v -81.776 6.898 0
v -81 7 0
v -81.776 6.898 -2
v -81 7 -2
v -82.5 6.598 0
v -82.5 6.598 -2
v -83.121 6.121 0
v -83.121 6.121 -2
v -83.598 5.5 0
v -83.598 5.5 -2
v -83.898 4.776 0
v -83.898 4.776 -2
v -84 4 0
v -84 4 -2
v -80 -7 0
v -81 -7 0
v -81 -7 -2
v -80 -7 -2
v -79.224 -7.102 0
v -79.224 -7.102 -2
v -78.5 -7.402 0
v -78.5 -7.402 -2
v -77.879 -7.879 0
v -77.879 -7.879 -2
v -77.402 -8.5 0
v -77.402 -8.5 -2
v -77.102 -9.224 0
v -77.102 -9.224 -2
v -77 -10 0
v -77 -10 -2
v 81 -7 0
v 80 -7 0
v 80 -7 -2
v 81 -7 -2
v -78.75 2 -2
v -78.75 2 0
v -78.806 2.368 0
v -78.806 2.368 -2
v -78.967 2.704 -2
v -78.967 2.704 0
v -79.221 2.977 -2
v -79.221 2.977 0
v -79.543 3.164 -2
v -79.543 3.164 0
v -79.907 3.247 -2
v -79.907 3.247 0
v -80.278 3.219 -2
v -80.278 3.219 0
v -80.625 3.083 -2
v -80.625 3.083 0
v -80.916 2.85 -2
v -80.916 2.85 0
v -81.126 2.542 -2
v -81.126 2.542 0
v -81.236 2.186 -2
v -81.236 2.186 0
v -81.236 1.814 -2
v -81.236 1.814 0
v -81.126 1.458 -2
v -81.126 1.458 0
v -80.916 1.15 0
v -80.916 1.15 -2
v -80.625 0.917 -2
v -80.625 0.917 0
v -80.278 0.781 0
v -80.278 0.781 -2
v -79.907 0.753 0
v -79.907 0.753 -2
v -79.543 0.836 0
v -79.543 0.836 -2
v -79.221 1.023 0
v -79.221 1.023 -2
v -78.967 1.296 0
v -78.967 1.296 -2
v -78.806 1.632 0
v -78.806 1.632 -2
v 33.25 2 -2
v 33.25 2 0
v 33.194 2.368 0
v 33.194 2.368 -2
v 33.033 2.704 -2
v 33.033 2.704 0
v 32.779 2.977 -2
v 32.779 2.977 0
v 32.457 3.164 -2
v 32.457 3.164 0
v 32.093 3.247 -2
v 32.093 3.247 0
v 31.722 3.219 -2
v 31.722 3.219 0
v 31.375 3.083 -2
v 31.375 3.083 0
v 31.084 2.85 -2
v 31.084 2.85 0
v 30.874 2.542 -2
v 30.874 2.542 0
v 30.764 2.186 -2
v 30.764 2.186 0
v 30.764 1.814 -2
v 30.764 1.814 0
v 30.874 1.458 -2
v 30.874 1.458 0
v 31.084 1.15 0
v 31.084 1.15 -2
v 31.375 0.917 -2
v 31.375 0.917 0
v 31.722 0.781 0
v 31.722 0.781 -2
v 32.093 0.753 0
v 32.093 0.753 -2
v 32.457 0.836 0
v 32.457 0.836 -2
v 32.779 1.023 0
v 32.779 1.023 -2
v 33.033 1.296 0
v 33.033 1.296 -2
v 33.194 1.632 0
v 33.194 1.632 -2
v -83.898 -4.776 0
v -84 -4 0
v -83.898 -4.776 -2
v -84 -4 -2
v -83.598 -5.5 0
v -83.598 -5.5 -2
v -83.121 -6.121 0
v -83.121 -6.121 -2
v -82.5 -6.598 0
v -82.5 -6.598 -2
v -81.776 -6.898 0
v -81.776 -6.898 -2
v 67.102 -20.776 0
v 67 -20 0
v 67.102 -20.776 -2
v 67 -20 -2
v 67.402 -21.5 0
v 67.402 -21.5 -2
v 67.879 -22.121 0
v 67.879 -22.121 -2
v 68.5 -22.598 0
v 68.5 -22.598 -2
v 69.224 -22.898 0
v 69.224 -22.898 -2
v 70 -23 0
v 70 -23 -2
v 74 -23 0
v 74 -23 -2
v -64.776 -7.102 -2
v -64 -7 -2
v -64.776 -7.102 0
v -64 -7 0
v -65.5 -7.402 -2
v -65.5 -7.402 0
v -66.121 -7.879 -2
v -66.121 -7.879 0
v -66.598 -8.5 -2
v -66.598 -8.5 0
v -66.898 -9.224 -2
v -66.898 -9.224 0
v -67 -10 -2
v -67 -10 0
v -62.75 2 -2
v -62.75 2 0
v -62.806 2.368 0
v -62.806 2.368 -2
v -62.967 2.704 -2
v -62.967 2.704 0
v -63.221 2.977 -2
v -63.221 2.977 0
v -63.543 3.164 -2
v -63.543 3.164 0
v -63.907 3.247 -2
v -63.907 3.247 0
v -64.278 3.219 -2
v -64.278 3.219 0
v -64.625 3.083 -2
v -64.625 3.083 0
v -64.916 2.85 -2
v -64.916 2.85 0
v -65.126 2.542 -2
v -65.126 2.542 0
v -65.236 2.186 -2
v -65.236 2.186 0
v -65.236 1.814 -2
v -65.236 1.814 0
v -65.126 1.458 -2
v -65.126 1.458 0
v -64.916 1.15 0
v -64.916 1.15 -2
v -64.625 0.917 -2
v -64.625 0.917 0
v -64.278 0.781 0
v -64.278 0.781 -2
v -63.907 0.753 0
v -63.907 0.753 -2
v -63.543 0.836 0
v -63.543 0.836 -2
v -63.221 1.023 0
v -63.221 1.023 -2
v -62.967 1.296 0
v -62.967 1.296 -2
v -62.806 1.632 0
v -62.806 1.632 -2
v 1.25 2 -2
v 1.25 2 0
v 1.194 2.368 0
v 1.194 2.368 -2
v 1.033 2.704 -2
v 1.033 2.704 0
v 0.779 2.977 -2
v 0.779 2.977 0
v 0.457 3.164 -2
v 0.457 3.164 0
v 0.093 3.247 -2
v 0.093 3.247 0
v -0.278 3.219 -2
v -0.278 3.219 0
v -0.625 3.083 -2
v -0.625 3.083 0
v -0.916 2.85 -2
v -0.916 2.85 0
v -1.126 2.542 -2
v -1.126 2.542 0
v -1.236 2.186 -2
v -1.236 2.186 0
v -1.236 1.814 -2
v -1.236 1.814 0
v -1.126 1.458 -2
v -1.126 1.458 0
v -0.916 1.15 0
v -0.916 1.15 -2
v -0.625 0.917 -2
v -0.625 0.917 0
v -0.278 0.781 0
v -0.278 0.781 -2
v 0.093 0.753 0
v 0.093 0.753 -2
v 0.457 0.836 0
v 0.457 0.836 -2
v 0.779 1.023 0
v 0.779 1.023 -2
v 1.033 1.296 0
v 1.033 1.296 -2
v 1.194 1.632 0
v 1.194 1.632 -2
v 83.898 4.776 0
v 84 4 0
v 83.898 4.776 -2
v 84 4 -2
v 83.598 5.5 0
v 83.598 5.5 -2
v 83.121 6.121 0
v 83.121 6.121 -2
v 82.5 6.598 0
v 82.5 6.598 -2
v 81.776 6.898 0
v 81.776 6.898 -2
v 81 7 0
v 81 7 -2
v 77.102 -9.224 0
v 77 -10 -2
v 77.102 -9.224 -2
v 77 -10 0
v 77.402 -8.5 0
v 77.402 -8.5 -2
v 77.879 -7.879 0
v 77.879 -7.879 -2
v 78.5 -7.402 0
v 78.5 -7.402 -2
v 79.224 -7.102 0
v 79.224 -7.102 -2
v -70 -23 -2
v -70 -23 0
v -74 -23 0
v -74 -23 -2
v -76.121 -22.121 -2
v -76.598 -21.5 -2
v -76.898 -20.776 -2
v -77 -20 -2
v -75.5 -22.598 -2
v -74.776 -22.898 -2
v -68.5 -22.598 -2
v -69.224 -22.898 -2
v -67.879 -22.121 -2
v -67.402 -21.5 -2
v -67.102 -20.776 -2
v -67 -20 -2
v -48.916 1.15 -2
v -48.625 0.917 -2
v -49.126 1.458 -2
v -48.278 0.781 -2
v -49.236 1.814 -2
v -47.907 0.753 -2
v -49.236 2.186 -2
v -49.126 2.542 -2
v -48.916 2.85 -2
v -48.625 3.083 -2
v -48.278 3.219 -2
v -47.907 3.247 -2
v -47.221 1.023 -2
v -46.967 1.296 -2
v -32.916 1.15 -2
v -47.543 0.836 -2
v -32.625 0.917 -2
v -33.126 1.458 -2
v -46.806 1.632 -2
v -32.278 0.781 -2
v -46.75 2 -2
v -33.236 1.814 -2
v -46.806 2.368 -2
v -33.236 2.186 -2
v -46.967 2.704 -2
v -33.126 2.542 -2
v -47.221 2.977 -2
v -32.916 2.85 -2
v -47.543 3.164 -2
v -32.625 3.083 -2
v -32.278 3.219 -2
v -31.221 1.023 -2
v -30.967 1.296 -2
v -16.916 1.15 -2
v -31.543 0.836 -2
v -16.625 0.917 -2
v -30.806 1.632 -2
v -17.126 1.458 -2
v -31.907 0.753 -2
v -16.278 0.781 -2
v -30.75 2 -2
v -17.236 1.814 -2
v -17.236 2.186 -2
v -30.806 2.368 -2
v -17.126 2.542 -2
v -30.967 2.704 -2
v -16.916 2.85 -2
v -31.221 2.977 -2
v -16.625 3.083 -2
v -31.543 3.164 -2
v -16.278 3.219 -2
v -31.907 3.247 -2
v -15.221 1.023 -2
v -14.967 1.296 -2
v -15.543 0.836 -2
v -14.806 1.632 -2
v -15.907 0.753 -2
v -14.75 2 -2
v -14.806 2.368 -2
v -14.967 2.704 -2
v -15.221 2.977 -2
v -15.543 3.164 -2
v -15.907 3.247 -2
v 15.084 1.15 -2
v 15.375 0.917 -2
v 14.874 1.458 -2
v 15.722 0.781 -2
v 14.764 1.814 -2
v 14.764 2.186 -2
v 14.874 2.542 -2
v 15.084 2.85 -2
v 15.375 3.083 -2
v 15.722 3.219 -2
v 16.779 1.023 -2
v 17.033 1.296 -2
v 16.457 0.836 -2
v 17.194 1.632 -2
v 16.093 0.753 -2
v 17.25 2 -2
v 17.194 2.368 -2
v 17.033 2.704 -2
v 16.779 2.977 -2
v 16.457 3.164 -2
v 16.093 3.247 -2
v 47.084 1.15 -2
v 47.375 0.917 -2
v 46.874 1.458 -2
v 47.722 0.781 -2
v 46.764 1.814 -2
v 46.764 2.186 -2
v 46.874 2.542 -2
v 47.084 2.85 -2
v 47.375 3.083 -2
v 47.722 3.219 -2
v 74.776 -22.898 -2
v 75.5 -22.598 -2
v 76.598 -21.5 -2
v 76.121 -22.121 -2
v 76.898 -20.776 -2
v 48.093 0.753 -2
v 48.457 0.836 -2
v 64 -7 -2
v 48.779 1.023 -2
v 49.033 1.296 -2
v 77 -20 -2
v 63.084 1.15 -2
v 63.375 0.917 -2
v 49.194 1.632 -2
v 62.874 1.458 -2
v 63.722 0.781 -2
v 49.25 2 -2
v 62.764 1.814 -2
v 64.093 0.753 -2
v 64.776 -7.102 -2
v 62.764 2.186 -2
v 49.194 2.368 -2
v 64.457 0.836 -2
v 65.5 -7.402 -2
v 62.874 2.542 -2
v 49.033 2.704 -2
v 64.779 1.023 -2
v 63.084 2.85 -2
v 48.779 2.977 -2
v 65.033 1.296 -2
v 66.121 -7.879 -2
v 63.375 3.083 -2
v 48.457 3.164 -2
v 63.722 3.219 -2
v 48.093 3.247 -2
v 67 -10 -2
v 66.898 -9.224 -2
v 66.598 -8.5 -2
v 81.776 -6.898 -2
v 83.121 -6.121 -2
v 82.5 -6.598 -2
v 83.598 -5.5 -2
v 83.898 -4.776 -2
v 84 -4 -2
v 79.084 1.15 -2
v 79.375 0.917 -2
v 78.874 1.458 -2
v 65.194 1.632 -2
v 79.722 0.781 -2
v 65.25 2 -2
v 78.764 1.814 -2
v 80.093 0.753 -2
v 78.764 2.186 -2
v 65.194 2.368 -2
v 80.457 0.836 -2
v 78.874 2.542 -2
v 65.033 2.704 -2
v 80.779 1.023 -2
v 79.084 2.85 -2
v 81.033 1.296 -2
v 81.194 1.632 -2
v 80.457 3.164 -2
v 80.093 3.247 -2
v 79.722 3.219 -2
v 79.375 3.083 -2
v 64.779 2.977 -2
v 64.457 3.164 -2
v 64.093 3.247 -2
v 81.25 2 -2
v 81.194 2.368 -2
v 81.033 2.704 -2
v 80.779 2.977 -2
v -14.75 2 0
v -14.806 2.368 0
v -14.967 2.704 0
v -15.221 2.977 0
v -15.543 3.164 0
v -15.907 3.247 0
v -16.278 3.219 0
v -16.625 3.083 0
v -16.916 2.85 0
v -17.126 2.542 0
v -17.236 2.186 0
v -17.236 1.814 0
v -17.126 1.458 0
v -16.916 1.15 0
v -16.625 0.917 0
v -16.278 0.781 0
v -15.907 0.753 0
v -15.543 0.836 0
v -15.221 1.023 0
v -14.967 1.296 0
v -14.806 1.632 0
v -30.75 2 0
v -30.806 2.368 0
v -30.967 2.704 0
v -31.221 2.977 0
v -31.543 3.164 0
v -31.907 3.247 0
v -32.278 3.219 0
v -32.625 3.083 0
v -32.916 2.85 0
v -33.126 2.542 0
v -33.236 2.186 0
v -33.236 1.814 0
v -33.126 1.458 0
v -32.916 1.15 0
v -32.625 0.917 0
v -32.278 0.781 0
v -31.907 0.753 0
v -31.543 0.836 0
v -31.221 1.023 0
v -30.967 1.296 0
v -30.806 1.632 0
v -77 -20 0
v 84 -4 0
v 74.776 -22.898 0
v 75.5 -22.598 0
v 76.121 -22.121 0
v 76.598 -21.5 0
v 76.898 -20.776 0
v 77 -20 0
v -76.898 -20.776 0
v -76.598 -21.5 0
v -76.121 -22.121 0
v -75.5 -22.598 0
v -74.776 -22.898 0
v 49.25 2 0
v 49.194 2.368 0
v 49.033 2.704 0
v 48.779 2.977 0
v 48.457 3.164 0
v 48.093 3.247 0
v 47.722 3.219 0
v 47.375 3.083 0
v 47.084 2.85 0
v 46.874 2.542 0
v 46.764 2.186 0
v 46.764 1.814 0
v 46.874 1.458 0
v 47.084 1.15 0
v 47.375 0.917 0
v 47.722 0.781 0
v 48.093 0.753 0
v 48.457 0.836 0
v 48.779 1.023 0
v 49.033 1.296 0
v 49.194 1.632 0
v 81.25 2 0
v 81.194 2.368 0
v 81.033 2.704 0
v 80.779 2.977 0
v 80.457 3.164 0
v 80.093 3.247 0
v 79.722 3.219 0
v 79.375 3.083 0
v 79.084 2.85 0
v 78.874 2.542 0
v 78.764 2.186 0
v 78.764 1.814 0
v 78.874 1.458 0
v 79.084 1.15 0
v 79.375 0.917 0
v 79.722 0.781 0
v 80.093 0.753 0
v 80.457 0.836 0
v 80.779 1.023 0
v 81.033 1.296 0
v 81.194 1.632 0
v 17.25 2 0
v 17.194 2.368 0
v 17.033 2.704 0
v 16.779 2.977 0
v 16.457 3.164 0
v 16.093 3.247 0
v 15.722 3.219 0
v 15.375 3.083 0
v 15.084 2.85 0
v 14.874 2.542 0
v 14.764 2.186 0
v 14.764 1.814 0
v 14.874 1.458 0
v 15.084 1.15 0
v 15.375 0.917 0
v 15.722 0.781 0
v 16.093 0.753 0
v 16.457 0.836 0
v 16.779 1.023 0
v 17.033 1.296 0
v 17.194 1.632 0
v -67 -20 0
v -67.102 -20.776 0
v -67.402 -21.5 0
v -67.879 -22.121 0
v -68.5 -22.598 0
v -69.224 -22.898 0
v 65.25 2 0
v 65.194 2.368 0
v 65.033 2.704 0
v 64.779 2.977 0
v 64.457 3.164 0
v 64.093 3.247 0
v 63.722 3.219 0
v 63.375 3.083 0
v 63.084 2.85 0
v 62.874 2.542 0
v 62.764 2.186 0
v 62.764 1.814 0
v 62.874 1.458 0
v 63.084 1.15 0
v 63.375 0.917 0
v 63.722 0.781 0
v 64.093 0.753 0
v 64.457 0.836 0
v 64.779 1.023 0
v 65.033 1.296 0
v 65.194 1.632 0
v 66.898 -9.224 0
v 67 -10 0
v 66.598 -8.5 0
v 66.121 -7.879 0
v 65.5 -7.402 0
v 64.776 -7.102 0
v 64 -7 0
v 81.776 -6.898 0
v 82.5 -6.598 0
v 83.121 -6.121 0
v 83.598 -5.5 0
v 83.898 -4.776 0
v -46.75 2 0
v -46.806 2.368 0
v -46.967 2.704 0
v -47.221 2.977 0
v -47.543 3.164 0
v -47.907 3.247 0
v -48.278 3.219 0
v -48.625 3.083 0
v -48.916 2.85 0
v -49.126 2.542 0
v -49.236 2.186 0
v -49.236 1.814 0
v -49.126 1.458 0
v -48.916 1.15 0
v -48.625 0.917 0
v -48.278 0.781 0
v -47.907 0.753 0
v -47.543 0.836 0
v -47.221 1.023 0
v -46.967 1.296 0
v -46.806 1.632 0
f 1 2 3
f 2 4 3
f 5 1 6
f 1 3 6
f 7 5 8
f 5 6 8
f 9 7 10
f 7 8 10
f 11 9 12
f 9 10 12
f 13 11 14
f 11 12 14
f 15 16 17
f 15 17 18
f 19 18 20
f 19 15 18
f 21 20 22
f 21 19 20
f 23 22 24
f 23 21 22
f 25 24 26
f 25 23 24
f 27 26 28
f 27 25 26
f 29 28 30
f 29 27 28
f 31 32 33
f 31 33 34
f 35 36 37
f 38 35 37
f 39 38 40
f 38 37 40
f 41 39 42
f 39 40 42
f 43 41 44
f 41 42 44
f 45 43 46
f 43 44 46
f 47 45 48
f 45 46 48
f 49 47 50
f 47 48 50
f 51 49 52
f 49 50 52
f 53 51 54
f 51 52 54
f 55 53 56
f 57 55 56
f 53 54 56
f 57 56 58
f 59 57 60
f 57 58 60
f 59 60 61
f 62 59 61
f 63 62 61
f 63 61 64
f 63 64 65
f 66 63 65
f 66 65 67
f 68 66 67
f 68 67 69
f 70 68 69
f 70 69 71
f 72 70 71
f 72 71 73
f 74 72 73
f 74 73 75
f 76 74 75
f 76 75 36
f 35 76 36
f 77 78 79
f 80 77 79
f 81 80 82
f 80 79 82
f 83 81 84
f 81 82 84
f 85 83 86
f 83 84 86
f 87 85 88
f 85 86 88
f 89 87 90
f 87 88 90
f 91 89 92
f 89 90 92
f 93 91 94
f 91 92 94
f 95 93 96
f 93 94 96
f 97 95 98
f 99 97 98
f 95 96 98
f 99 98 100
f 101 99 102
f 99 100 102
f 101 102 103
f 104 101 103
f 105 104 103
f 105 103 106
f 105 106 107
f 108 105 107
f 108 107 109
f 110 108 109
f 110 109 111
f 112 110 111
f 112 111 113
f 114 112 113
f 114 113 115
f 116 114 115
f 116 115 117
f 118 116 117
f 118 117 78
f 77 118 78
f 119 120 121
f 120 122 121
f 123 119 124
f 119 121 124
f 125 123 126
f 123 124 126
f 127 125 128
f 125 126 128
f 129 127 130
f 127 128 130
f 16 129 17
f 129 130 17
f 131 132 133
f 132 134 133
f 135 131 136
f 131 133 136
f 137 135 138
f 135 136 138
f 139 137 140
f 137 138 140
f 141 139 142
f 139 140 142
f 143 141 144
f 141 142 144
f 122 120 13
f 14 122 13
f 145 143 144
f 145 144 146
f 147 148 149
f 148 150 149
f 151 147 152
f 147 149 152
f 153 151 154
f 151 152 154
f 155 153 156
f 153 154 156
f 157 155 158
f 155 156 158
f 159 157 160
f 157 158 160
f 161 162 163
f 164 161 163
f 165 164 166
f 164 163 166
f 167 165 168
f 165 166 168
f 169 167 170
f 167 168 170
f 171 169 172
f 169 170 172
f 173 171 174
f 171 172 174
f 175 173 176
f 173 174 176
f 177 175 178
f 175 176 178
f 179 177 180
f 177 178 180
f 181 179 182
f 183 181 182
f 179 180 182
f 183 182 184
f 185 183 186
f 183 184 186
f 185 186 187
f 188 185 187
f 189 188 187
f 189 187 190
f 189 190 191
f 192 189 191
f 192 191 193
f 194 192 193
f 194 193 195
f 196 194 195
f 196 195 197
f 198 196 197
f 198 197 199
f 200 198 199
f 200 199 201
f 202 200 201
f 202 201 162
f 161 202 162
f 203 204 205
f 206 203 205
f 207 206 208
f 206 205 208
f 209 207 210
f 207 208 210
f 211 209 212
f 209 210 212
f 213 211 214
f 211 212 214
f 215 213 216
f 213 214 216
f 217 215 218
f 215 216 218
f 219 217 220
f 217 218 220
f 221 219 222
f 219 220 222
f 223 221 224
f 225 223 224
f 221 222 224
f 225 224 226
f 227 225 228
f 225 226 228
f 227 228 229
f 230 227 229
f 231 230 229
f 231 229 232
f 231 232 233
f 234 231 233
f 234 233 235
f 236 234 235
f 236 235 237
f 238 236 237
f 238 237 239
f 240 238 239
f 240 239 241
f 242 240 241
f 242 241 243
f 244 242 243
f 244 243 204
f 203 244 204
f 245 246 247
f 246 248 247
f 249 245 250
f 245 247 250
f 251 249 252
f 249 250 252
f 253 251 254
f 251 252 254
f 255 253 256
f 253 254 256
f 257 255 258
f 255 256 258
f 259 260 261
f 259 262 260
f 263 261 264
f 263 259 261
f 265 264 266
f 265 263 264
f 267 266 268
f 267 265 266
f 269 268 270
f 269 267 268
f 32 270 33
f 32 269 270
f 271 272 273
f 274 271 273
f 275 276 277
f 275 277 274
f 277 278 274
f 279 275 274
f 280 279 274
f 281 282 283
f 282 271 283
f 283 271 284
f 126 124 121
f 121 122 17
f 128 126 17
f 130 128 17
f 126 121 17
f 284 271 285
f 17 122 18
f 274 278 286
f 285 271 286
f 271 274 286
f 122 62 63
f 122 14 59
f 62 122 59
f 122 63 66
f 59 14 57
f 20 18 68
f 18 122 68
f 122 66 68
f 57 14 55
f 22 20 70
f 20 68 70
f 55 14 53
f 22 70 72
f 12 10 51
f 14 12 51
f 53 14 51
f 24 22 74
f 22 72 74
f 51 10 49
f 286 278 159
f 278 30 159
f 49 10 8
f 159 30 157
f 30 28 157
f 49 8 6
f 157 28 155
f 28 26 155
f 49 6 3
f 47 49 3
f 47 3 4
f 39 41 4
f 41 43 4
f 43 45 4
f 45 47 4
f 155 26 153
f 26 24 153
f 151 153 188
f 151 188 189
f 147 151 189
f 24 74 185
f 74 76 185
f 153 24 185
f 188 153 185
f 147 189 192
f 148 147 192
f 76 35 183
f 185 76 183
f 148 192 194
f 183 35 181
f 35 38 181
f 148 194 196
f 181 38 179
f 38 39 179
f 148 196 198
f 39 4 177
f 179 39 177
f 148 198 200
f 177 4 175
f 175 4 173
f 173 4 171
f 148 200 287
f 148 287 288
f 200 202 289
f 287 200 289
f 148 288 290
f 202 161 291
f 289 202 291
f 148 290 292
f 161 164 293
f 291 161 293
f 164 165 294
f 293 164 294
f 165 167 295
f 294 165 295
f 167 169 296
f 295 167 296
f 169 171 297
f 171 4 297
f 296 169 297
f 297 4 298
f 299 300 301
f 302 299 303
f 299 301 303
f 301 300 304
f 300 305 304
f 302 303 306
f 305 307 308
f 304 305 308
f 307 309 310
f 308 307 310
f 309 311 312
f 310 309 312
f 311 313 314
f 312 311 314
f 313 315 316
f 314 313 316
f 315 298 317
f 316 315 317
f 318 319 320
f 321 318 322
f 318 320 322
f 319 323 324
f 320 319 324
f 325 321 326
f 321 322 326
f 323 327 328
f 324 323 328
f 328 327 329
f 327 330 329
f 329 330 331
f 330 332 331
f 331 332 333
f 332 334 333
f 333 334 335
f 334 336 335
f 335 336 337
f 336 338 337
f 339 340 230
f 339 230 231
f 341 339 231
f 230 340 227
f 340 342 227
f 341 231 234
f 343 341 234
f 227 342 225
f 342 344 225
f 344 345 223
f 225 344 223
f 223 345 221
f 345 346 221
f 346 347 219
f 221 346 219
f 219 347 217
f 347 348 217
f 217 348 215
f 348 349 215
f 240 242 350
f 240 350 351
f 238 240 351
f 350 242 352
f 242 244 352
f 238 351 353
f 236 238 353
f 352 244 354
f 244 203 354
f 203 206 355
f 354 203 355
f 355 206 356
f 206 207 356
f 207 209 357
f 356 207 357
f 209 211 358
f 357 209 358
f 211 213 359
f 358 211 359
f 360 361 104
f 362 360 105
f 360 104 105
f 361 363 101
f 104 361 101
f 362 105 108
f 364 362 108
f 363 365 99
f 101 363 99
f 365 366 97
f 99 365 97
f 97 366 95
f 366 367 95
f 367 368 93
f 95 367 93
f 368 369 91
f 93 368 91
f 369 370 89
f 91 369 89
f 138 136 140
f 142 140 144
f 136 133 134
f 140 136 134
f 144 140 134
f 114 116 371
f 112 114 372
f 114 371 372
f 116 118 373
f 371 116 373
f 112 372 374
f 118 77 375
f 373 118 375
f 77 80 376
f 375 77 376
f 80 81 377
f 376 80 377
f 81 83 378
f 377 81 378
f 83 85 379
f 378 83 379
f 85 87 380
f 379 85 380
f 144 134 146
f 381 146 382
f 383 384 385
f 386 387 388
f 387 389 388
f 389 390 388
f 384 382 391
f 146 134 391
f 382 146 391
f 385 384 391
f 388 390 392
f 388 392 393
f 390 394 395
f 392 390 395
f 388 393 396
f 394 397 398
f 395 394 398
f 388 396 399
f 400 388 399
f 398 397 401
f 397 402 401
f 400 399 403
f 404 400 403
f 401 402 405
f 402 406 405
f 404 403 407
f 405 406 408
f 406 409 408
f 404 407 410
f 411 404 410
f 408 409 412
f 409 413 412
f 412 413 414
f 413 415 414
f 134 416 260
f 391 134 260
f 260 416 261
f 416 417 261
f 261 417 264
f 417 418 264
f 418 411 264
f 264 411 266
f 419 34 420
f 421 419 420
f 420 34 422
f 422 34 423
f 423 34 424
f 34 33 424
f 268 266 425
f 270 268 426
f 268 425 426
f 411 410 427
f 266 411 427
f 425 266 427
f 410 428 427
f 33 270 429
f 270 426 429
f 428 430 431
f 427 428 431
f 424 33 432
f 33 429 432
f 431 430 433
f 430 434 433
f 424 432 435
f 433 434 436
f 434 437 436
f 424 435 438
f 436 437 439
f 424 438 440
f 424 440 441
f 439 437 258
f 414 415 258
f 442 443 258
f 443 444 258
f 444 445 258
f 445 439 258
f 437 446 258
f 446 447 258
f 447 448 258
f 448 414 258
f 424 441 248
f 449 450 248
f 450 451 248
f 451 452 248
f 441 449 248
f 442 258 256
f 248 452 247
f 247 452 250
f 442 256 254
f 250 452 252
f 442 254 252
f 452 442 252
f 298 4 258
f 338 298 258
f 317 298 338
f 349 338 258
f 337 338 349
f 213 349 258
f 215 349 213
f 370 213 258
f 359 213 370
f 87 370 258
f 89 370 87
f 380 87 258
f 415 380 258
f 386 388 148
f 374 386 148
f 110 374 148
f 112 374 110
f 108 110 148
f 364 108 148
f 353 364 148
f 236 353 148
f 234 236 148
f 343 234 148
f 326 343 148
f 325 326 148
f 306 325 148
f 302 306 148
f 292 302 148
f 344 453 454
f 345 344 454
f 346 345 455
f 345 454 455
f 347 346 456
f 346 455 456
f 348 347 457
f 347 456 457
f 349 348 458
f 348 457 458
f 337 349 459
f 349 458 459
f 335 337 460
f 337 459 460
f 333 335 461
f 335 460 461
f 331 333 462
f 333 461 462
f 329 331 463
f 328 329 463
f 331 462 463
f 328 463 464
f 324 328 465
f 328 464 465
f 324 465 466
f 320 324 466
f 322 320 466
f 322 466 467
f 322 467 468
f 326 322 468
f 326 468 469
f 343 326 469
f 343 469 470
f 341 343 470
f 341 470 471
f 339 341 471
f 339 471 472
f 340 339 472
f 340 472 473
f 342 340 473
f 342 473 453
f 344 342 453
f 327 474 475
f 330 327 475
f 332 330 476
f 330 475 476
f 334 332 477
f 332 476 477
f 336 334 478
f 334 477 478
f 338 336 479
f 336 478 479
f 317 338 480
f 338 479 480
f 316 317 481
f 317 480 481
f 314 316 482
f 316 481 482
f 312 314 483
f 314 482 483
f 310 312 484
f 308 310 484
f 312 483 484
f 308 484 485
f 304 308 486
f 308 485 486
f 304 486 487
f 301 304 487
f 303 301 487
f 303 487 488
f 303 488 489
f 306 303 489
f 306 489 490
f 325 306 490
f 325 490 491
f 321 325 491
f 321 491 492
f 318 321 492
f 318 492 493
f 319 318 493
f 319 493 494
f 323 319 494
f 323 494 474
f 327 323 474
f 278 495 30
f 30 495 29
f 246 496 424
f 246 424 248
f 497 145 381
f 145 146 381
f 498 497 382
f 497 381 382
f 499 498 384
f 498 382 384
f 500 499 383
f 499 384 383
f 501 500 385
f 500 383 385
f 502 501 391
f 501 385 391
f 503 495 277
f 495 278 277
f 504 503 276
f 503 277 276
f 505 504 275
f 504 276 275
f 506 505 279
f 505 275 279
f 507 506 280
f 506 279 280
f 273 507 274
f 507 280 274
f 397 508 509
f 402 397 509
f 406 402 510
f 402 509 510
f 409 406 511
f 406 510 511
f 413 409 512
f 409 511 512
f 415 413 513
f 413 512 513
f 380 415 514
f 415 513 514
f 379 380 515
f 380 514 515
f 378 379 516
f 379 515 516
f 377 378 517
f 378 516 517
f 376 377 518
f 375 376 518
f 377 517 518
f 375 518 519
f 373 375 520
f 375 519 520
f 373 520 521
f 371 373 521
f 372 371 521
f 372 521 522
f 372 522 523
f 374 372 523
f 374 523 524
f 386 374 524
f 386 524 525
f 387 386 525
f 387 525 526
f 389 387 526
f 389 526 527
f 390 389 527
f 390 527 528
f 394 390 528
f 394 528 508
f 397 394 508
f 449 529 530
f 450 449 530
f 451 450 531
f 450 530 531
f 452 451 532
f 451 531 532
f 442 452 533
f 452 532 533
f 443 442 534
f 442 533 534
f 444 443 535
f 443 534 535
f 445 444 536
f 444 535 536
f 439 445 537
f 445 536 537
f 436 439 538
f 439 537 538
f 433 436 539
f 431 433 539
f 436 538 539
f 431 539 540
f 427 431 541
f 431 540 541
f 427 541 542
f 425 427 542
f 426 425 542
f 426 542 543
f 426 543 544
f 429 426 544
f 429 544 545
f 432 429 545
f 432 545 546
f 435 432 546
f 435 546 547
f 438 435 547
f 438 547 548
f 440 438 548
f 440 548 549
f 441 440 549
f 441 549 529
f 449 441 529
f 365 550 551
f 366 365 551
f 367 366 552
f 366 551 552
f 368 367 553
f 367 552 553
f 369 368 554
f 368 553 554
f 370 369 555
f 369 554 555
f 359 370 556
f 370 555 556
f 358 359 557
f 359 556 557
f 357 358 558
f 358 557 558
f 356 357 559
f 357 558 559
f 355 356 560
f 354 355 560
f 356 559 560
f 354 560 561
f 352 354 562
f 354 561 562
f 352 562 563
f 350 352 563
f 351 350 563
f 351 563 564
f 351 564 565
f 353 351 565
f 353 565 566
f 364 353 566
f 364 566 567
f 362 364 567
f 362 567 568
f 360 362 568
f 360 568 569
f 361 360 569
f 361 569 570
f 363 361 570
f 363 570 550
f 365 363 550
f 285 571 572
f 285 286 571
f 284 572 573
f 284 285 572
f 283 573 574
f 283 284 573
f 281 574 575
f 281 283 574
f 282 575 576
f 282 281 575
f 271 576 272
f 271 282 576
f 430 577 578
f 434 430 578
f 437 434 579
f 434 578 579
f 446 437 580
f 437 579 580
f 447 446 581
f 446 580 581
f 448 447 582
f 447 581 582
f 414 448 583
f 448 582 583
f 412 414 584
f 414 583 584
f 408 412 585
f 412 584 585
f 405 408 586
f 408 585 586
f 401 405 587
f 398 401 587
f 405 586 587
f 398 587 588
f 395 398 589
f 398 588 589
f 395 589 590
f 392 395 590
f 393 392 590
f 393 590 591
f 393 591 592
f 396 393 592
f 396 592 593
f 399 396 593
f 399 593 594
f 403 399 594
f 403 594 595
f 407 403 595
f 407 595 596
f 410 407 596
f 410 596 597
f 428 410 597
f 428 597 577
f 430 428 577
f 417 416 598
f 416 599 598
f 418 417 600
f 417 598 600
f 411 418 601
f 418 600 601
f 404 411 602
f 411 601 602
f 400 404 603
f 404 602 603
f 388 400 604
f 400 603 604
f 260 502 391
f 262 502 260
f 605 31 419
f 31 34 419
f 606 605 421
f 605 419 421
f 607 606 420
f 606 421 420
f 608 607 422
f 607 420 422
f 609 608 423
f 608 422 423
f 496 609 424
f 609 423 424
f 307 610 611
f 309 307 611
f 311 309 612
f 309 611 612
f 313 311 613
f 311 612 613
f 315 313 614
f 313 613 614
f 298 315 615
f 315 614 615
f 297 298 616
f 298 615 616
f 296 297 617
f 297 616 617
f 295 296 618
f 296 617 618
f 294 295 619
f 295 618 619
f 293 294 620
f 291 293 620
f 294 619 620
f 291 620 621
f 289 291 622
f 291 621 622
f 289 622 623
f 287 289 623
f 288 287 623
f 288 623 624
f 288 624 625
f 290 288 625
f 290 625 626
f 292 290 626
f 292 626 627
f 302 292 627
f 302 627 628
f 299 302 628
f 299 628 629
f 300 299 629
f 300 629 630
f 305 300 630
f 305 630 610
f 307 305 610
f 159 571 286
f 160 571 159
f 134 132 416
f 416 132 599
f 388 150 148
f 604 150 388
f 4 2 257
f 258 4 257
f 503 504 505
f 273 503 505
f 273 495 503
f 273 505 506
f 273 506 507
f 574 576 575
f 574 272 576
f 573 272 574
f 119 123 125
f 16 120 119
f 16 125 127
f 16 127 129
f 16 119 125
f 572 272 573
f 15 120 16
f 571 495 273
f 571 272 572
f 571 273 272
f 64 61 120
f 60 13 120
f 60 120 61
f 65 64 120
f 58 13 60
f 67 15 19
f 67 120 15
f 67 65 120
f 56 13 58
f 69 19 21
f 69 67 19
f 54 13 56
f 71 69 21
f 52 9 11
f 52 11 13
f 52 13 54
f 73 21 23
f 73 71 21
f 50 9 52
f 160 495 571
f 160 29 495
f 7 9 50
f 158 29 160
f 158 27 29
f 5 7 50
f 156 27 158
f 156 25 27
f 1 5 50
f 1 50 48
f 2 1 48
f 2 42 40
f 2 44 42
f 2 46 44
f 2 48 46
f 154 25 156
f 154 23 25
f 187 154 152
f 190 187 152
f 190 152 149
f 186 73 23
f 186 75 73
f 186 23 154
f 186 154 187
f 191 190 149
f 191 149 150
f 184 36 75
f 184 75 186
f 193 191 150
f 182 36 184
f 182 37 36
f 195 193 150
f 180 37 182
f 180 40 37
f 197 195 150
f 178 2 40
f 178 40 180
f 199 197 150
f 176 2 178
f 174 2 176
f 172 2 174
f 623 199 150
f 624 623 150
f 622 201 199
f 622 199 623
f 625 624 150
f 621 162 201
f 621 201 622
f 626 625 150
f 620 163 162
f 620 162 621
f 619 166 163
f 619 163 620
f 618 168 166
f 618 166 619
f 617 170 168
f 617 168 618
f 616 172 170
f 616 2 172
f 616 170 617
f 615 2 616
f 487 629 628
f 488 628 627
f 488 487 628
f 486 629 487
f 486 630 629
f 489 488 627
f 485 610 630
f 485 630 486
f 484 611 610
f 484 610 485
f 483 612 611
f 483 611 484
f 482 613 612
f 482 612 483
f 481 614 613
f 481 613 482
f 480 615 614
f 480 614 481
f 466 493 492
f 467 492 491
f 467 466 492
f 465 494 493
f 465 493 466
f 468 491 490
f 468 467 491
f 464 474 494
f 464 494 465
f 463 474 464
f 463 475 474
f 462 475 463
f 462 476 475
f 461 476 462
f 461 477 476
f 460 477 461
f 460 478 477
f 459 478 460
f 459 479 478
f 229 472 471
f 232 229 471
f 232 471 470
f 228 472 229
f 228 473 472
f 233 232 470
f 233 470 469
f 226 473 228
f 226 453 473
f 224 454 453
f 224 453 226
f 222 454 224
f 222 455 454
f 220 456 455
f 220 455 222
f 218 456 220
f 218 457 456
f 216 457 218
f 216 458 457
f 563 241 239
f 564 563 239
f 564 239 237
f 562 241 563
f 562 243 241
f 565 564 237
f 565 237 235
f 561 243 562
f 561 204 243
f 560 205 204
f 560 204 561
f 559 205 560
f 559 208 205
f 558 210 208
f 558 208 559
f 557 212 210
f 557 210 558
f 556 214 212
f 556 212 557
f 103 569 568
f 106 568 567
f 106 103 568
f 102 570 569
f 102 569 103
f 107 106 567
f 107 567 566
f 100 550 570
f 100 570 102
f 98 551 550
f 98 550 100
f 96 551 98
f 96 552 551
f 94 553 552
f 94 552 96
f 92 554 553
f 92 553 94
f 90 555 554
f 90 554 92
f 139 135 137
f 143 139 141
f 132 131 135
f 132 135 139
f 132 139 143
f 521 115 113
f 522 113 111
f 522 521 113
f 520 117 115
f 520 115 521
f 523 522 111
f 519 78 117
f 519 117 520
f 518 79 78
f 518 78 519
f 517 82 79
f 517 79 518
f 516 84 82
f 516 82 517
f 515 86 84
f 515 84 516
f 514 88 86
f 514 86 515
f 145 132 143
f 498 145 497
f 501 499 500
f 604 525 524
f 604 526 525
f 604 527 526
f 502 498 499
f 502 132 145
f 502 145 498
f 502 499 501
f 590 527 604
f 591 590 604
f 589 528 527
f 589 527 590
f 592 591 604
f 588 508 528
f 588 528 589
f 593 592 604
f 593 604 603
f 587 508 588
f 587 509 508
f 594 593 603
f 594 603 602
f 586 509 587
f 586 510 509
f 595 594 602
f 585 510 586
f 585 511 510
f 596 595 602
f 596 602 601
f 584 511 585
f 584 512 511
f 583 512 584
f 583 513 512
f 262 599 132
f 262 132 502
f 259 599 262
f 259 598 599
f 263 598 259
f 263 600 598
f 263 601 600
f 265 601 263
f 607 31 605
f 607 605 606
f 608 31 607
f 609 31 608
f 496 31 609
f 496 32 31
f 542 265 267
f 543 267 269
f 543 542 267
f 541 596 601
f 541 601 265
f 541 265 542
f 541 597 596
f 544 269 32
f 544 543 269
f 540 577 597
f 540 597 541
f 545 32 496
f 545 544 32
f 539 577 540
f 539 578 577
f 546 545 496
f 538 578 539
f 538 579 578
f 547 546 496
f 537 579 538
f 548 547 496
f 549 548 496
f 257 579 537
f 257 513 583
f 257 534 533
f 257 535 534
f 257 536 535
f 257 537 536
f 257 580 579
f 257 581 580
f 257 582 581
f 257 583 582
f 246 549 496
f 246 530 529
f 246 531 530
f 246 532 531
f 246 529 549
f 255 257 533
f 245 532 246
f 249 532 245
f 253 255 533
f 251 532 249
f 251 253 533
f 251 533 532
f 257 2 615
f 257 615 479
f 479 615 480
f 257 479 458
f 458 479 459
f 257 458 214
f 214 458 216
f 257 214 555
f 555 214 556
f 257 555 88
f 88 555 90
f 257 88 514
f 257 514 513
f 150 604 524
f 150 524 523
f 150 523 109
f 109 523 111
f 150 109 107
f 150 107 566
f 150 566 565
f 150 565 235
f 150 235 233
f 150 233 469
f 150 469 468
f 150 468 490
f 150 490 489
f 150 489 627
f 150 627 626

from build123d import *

# Parameters (mm, degrees)
BASE_SKETCH_W            = 168
BASE_SKETCH_H            = 14
BASE_EXTRUDE_DEPTH       = 2
PIN_HOLE_SKETCH_R        = 1.25
FIRST_PIN_HOLE_CUT_DEPTH = 85.314885993
PIN_HOLE_PATTERN_COUNT   = 11
PIN_HOLE_PATTERN_PITCH   = 16
EXTENSION_SKETCH_W       = 10
EXTENSION_SKETCH_H       = 25
TAB_EXTRUDE_DEPTH        = 2
CORNER_FILLETS_R         = 3


with BuildPart() as part:
    # Base Sketch → Base Extrude (new body)
    with BuildSketch(Plane.XY):
        Rectangle(BASE_SKETCH_W, BASE_SKETCH_H)
    extrude(amount=-BASE_EXTRUDE_DEPTH)

    # Pin Hole Sketch → First Pin Hole Cut (cut, through all)
    with BuildSketch(Plane.XY):
        with Locations((80, 2)):
            Circle(PIN_HOLE_SKETCH_R)
    first_pin_hole_cut = extrude(amount=-FIRST_PIN_HOLE_CUT_DEPTH, mode=Mode.SUBTRACT)

    # Pin Hole Pattern: First Pin Hole Cut ×11
    with Locations(*[(-i * PIN_HOLE_PATTERN_PITCH, 0, 0) for i in range(1, PIN_HOLE_PATTERN_COUNT)]):
        add(first_pin_hole_cut, mode=Mode.SUBTRACT)


with BuildPart() as body_2:
    # Extension Sketch → Tab Extrude (new, through all)
    with BuildSketch(Plane.XY):
        with Locations((72, -10.5)):
            Rectangle(EXTENSION_SKETCH_W, EXTENSION_SKETCH_H)
    tab_extrude = extrude(amount=-TAB_EXTRUDE_DEPTH)


with BuildPart() as part_1:
    add(part.part)

    # Tab Mirror: Tab Extrude across plane
    add(tab_extrude.mirror(Plane(origin=(0, 0, 0), x_dir=(0, 0, 1), z_dir=(1, 0, 0))))

    # Combine Bodies: union body 2
    add(body_2.part)

    # Corner Fillets
    corner_fillets_edges = [part_1.edges().sort_by_distance(p)[0] for p in [
        (-77, -7, -1),
        (-77, -23, -1),
        (-67, -23, -1),
        (-67, -7, -1),
        (77, -7, -1),
        (77, -23, -1),
        (67, -7, -1),
        (67, -23, -1),
        (-84, 7, -1),
        (84, 7, -1),
        (84, -7, -1),
        (-84, -7, -1),
    ]]
    fillet(corner_fillets_edges, radius=CORNER_FILLETS_R)


solid = part_1.part
